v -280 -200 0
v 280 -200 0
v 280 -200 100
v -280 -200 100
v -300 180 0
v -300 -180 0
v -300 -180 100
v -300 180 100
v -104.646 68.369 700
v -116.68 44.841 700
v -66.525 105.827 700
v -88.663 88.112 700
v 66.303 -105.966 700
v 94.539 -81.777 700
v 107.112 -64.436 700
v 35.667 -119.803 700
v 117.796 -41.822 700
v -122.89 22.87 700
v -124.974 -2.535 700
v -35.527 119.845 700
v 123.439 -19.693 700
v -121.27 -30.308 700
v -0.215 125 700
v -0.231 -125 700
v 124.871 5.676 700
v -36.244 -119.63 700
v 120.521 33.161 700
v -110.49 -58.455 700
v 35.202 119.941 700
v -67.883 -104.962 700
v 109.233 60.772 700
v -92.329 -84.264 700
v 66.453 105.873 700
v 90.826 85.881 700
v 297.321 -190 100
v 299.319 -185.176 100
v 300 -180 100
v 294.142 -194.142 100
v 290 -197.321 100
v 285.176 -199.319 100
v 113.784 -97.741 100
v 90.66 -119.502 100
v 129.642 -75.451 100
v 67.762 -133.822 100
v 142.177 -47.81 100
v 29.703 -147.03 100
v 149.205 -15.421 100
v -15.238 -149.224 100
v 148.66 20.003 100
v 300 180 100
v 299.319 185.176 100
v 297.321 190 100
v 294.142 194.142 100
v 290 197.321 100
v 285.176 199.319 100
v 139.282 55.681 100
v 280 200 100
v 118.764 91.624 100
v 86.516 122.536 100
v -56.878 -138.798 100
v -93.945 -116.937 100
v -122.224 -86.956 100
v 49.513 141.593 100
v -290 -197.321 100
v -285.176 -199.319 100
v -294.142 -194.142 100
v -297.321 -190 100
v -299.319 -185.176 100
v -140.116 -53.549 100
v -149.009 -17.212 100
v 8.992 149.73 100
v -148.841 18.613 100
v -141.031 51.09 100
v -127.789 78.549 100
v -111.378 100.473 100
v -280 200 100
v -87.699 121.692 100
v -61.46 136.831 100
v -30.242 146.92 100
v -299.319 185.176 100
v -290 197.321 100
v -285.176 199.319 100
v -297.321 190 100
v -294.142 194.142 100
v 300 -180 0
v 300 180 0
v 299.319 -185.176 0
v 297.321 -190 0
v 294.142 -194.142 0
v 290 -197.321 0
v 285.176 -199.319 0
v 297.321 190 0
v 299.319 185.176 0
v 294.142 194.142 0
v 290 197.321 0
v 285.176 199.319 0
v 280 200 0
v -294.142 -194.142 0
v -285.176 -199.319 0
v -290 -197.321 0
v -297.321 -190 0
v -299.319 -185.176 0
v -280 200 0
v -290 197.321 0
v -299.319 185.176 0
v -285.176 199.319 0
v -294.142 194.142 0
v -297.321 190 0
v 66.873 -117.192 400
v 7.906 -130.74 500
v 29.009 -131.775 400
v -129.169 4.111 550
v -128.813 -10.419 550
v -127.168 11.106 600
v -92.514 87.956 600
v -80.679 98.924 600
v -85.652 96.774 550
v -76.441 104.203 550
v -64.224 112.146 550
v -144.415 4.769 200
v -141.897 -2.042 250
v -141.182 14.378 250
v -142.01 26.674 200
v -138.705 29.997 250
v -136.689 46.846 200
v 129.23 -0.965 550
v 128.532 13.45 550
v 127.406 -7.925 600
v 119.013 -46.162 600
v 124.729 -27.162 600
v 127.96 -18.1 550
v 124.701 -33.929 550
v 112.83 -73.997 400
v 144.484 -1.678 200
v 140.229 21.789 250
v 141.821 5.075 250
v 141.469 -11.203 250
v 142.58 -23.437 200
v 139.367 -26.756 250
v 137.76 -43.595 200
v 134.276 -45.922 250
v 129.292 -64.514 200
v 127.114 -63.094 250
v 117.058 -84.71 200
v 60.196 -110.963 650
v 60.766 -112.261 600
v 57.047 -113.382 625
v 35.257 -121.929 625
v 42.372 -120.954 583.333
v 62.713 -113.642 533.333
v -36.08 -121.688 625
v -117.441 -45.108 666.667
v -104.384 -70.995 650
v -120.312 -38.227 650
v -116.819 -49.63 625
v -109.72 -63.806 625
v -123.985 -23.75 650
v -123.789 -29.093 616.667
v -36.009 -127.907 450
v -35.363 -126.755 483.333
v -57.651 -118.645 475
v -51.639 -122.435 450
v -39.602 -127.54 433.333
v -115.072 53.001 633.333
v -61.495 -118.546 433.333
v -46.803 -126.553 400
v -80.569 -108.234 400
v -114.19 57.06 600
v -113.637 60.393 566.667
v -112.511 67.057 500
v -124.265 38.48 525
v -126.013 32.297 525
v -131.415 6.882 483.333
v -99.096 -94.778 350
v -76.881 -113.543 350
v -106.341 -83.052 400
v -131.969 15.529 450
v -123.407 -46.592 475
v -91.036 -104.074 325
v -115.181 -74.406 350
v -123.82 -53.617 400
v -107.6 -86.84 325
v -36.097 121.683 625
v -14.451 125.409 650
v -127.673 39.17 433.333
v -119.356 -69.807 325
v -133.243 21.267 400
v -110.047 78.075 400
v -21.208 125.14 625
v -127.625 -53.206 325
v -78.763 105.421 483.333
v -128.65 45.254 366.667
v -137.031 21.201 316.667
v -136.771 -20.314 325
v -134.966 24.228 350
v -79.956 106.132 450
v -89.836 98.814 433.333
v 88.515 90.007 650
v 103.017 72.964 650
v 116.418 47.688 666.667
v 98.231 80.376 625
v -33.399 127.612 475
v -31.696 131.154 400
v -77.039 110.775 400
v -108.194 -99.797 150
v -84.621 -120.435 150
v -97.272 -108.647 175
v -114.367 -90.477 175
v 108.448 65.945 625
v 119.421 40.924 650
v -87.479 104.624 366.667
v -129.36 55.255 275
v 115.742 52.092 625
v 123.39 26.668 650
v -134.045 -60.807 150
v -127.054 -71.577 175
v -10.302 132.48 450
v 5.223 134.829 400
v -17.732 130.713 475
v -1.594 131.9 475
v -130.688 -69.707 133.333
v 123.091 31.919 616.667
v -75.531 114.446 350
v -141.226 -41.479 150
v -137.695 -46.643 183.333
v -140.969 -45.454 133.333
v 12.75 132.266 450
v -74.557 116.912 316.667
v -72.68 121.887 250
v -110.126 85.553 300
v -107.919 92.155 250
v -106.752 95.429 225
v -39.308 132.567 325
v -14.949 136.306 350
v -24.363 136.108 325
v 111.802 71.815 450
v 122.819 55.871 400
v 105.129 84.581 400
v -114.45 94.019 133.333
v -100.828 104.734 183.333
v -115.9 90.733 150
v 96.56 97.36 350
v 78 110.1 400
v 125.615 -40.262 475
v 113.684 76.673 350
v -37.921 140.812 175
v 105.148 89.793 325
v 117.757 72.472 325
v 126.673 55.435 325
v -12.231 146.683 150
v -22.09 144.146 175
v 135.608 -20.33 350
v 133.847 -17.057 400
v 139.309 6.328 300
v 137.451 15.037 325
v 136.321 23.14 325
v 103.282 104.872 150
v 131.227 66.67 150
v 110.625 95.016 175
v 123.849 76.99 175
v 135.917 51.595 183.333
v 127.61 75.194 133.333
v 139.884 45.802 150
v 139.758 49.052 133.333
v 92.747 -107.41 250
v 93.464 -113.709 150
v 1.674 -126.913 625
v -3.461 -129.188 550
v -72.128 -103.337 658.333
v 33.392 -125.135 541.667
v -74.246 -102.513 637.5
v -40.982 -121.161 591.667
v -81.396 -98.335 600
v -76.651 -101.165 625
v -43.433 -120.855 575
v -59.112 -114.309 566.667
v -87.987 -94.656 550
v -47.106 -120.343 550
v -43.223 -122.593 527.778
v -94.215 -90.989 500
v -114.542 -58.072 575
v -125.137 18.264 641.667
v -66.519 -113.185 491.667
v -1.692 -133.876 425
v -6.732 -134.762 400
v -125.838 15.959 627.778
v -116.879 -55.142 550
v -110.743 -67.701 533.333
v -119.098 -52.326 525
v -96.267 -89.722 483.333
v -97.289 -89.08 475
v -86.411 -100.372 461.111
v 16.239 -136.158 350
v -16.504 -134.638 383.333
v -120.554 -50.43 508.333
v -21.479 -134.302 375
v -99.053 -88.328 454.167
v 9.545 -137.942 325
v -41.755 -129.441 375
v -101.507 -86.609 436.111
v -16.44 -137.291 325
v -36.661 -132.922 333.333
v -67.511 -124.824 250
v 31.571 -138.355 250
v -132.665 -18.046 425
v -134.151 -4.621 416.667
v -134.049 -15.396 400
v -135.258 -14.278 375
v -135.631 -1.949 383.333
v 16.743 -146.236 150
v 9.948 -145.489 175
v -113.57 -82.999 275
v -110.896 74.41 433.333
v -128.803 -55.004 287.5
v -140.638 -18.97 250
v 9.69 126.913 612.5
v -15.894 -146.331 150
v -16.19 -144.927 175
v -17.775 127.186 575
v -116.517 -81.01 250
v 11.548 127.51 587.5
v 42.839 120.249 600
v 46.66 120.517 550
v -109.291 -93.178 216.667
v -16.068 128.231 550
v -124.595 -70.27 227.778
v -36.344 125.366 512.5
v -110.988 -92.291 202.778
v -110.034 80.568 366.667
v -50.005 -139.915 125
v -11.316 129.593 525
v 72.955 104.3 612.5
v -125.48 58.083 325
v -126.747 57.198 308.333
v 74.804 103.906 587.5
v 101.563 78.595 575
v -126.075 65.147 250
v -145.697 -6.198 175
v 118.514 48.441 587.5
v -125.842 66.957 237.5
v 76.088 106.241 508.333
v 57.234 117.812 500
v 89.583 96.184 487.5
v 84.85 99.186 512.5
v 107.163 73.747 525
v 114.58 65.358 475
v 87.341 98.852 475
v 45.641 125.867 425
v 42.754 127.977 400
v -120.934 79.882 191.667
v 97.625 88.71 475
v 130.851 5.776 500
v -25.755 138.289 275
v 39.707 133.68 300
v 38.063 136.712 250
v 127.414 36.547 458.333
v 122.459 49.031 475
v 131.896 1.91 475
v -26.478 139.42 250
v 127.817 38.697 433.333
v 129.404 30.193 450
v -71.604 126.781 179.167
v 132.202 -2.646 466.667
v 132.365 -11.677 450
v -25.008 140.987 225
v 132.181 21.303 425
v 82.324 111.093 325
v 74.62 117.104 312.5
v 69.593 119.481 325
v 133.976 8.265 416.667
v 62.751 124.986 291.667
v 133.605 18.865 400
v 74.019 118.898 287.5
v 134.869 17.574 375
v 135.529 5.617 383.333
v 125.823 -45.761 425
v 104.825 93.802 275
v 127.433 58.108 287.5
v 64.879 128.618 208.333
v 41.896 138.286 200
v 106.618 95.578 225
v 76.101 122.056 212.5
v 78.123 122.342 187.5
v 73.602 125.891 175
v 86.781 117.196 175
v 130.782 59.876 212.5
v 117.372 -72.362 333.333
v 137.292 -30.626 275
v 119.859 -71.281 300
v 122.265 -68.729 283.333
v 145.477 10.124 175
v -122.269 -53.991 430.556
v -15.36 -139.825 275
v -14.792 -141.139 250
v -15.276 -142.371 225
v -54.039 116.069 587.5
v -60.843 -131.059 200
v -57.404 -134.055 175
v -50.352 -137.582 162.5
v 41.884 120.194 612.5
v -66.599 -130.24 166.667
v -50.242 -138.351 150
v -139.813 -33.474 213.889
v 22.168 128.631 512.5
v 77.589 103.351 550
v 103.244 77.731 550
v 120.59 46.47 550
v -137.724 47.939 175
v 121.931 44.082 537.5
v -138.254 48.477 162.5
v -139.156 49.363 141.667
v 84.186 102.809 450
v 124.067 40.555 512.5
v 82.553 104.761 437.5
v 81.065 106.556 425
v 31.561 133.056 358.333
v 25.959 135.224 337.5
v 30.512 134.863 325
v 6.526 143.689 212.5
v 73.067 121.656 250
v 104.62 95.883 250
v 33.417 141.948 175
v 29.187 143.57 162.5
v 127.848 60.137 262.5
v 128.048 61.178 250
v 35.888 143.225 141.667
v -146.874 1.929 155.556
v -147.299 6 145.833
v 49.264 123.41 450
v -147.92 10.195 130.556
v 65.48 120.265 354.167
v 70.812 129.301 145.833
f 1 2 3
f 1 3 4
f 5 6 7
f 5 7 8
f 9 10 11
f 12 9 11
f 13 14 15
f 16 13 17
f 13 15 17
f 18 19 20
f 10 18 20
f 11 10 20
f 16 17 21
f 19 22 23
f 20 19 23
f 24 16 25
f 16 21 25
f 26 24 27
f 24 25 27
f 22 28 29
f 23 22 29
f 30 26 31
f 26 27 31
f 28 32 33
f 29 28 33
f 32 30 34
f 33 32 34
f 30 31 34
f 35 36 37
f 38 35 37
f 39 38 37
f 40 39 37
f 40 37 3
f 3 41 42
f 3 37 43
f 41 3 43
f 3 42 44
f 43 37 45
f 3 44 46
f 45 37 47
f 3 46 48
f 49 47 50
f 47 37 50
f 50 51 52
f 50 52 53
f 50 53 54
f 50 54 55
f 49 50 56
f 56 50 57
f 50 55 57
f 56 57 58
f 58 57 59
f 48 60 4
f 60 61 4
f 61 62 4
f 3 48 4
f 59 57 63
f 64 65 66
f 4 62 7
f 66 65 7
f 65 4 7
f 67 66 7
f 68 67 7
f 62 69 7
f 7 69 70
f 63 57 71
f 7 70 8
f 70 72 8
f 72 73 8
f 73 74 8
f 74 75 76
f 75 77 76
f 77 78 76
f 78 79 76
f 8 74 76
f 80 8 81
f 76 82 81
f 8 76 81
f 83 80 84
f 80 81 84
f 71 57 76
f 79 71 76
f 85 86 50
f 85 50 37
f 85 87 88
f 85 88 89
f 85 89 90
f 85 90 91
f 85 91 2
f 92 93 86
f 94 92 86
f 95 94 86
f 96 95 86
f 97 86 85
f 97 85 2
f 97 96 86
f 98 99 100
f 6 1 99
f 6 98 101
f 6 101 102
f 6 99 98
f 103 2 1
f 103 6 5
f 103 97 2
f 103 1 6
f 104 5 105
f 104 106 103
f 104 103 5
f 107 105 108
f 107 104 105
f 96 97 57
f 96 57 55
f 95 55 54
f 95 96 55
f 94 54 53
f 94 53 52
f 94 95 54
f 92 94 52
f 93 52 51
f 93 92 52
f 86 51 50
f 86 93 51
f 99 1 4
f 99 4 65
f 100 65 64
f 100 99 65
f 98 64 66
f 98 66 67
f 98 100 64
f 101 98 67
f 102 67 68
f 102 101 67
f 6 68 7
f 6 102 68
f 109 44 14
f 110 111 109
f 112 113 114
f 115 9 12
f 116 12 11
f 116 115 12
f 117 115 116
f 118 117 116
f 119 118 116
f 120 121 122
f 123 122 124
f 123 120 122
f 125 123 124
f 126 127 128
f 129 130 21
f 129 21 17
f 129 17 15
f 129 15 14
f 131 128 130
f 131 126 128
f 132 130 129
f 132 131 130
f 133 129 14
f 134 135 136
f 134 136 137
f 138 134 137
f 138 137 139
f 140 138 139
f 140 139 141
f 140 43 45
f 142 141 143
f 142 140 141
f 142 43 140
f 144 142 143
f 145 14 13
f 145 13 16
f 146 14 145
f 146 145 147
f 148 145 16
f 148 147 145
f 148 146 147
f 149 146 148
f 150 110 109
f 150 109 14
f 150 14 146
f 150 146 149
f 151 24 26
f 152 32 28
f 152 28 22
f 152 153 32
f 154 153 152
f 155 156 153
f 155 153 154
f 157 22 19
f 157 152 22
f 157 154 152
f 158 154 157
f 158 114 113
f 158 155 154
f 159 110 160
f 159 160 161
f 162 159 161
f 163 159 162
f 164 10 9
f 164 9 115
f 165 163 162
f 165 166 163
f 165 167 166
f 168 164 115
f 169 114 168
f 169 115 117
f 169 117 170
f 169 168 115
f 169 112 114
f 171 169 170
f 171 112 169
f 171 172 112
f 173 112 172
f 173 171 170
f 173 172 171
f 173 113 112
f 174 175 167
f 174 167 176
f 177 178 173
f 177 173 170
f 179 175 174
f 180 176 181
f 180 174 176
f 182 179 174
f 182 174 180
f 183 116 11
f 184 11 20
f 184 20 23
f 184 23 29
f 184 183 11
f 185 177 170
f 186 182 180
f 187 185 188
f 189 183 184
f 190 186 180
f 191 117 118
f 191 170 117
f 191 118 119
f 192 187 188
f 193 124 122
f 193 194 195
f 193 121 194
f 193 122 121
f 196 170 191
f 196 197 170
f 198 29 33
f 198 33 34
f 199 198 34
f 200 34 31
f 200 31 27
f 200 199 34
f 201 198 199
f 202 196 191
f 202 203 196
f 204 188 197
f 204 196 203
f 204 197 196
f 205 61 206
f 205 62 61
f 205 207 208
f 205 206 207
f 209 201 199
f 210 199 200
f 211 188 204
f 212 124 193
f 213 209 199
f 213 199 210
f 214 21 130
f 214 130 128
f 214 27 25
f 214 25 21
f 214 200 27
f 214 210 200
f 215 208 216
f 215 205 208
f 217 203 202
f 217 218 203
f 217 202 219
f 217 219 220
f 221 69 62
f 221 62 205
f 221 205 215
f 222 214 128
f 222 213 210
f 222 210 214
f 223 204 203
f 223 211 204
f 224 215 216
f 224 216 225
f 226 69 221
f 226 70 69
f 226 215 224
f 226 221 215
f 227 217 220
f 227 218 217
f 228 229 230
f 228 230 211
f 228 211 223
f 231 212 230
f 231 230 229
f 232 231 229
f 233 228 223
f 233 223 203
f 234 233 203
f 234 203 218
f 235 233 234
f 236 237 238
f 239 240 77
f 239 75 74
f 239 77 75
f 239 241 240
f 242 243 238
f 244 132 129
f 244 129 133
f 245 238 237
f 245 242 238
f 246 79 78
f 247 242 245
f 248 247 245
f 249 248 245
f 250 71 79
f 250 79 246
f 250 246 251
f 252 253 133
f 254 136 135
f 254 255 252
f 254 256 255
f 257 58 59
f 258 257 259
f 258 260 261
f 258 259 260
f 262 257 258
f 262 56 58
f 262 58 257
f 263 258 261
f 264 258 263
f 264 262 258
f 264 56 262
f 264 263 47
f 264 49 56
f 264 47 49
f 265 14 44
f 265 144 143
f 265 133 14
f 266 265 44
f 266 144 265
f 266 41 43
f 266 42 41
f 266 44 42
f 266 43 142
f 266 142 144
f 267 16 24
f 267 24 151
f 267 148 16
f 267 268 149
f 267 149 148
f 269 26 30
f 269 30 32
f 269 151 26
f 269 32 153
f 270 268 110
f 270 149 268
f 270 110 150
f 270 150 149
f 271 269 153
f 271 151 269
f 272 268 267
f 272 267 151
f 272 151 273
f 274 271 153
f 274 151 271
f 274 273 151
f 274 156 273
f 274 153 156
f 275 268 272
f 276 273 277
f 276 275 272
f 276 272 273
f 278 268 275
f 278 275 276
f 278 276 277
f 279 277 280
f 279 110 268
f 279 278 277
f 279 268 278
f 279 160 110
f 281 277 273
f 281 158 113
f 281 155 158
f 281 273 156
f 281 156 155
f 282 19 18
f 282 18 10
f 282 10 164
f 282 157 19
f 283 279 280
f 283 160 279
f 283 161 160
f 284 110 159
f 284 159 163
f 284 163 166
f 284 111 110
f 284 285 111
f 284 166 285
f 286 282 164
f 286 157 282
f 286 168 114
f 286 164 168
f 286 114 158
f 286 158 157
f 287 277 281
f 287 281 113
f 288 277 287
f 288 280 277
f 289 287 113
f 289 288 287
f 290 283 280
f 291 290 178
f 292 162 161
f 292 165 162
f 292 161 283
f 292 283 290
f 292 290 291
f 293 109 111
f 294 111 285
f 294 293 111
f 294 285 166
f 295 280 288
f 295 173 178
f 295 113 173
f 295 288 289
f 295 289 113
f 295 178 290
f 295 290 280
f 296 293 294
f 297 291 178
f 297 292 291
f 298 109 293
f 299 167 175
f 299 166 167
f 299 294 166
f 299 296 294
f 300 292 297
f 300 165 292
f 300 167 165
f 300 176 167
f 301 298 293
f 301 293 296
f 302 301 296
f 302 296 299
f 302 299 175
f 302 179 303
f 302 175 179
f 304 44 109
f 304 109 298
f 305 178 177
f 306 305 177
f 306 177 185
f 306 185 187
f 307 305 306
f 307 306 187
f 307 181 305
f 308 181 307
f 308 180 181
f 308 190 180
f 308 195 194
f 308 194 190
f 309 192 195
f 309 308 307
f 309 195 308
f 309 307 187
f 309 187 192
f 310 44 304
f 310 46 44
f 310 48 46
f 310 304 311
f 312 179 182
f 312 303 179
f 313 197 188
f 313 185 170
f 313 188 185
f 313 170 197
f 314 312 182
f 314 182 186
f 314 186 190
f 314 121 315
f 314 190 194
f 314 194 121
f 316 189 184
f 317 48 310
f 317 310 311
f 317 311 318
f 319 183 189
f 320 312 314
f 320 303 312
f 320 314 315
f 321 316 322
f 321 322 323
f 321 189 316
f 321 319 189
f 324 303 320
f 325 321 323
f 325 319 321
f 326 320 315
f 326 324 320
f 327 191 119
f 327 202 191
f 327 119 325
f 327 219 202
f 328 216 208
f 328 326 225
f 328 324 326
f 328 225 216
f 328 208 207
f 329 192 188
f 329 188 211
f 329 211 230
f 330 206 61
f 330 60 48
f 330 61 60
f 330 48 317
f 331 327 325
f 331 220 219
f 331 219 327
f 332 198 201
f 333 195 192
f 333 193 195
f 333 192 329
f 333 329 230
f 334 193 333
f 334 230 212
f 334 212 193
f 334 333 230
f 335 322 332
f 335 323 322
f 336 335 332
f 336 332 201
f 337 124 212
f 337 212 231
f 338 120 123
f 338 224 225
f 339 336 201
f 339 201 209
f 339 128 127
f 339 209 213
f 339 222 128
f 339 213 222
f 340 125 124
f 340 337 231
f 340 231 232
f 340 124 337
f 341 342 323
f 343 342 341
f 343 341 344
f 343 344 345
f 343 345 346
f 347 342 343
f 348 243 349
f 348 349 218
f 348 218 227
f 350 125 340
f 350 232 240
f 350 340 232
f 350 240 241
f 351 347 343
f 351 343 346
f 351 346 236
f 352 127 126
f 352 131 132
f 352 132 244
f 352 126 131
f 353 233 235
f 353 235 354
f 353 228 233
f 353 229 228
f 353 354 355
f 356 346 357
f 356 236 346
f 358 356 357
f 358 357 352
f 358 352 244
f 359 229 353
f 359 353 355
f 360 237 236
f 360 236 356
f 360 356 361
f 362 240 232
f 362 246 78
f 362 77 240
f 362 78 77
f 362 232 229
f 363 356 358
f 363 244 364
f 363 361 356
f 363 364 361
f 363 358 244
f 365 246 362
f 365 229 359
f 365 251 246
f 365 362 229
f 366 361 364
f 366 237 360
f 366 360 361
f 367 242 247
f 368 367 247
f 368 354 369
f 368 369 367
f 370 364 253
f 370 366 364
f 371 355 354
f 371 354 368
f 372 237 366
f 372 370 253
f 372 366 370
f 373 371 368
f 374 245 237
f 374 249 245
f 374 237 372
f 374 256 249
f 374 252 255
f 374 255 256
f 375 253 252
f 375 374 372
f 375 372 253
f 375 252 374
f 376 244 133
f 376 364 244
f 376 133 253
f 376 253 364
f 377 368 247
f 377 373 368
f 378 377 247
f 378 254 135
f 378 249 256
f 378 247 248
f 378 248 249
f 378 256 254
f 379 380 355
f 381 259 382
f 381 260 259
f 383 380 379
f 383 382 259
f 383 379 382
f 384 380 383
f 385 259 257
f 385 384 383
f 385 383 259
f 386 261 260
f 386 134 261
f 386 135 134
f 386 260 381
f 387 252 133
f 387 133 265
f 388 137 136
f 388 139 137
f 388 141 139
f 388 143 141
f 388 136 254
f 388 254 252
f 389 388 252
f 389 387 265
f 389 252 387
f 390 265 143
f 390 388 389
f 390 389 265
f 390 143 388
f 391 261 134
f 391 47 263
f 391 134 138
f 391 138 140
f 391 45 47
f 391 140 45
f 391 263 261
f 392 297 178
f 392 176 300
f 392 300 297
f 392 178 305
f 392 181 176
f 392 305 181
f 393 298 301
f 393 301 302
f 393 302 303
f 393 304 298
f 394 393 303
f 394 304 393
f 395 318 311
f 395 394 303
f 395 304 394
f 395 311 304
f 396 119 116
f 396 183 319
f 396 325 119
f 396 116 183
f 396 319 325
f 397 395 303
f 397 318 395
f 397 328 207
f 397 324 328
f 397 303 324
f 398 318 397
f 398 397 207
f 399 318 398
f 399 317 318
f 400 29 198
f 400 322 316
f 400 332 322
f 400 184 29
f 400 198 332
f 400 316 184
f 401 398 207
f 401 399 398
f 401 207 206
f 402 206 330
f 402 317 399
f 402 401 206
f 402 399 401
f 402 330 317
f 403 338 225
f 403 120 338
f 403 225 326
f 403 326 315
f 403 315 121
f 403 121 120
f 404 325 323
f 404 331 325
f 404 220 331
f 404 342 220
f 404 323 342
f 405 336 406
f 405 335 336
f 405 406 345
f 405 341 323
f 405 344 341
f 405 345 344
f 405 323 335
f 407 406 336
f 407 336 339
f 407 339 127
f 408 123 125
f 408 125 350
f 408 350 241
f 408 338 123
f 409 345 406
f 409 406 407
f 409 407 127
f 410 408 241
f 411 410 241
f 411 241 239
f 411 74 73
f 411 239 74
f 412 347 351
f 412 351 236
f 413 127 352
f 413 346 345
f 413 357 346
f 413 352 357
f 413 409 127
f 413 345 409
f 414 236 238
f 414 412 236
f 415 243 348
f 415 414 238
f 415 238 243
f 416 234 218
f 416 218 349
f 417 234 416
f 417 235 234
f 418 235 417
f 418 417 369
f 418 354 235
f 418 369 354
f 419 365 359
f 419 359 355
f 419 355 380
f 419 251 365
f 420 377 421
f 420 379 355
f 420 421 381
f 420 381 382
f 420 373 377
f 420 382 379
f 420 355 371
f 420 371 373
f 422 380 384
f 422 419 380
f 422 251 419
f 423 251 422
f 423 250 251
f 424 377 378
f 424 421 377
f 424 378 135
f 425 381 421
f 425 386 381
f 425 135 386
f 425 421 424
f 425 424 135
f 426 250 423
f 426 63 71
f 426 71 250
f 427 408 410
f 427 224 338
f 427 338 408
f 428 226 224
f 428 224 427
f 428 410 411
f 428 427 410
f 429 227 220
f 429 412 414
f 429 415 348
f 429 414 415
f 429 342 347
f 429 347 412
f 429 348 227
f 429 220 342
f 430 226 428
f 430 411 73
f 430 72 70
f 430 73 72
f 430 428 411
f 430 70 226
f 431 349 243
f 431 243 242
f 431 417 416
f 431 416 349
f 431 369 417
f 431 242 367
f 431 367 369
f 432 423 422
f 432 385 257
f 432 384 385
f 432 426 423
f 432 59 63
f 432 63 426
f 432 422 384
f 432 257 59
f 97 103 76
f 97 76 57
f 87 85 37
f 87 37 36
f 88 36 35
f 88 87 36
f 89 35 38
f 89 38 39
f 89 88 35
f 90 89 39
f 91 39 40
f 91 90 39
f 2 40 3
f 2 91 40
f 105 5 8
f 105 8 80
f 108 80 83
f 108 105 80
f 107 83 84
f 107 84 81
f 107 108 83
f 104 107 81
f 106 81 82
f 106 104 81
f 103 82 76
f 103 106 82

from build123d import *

# Parameters (mm, degrees)
BOSS_EXTRUDE3_DEPTH   = 100
BODY_MOVE_COPY2_ANGLE = 90


with BuildPart() as part:
    # Sketch4 → Boss-Extrude3 (new body)
    with BuildSketch(Plane(origin=(0, 0, 0), x_dir=(1, 0, 0), z_dir=(0, 1, 0))):
        with BuildLine():
            Line((-280, 200), (280, 200))
            ThreePointArc((280, 200), (294.142135624, 194.142135624), (300, 180))
            Line((300, 180), (300, -180))
            ThreePointArc((300, -180), (294.142135624, -194.142135624), (280, -200))
            Line((280, -200), (-280, -200))
            ThreePointArc((-280, -200), (-294.142135624, -194.142135624), (-300, -180))
            Line((-300, -180), (-300, 180))
            ThreePointArc((-300, 180), (-294.142135624, 194.142135624), (-280, 200))
        make_face()
    extrude(amount=BOSS_EXTRUDE3_DEPTH)

    # Loft1: read off the stored shape, not the designer's step
    # Loft1: loft between two sections, ruled curve by curve
    loft1_from = [
        Edge.make_bspline([(94.538797531, 700, 81.776621117), (-69.014444703, 700, 270.85421618), (-258.092039765, 700, 107.300973946), (-94.538797531, 700, -81.776621117), (69.014444703, 700, -270.85421618), (258.092039765, 700, -107.300973946), (94.538797531, 700, 81.776621117)], [0, 0, 0, 0, 0.5, 0.5, 0.5, 1, 1, 1, 1], 3, [1, 0.333333333, 0.333333333, 1, 0.333333333, 0.333333333, 1]),
    ]
    loft1_to = [
        Edge.make_bspline([(67.762458695, 100, 133.821706728), (-199.880954762, 100, 269.346624118), (-335.405872151, 100, 1.703210661), (-67.762458695, 100, -133.821706728), (199.880954762, 100, -269.346624118), (335.405872151, 100, -1.703210661), (67.762458695, 100, 133.821706728)], [0, 0, 0, 0, 0.5, 0.5, 0.5, 1, 1, 1, 1], 3, [1, 0.333333333, 0.333333333, 1, 0.333333333, 0.333333333, 1]),
    ]
    loft1 = Solid(Shell([*[Face.make_surface_from_curves(loft1_from[k], loft1_to[k]) for k in range(1)], Face(Wire(loft1_from)), Face(Wire(loft1_to))]))
    add(loft1)


with BuildPart() as part_1:
    # Body-Move/Copy2: moved
    add(part.part.rotate(Axis((0, 0, 0), (1, 0, 0)), BODY_MOVE_COPY2_ANGLE))


solid = part_1.part
